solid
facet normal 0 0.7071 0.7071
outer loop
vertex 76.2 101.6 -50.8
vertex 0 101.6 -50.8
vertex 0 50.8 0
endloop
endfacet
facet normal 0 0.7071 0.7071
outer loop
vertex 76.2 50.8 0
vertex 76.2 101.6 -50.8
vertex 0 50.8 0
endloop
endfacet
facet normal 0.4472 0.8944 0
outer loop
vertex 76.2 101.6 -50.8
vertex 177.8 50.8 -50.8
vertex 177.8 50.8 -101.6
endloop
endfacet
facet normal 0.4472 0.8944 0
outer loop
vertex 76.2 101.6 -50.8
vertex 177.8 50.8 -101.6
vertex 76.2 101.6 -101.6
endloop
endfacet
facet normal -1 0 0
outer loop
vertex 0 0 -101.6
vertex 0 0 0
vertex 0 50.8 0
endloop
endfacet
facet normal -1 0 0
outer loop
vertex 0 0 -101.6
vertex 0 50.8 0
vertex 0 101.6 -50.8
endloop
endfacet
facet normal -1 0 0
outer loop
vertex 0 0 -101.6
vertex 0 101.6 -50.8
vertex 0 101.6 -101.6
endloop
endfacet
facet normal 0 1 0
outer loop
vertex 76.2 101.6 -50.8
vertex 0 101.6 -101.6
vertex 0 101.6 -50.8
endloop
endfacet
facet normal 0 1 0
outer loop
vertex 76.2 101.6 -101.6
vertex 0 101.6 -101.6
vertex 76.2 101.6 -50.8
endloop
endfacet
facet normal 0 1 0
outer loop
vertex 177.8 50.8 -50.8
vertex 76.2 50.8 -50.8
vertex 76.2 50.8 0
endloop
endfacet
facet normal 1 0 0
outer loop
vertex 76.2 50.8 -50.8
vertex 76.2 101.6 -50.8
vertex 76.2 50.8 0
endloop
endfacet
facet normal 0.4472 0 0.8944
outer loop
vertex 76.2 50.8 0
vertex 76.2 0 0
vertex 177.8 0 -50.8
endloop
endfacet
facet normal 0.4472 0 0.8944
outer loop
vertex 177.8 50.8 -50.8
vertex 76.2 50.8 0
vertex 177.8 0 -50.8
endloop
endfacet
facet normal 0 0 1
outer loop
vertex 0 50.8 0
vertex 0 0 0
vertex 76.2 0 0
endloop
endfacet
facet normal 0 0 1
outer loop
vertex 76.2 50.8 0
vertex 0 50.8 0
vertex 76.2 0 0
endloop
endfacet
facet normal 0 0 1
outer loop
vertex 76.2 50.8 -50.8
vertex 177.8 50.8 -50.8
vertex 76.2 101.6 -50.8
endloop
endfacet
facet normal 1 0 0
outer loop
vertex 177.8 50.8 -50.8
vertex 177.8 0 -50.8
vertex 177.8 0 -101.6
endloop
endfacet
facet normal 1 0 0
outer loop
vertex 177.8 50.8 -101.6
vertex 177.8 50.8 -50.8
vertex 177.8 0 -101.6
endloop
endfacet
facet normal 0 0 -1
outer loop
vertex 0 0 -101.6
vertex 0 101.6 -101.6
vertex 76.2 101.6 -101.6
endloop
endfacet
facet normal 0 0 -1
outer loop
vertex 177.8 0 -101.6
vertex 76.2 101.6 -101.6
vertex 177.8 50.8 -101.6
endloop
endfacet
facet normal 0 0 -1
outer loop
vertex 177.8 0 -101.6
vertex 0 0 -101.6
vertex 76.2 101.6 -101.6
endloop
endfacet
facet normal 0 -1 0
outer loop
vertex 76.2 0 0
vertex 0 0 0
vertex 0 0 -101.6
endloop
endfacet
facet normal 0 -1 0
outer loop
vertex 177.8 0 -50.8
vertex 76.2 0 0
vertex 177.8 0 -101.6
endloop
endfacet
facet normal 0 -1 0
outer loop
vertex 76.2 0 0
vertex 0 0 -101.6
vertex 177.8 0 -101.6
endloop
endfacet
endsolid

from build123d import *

# Parameters (mm, degrees)
SKETCH1_W                = 177.8
SKETCH1_H                = 101.6
BOSS_EXTRUDE1_DEPTH      = 101.6
CUT_EXTRUDE7_DEPTH       = 1
CUT_EXTRUDE7_DEPTH_BACK  = 76.2
CUT_EXTRUDE10_DEPTH      = 50.8
CUT_EXTRUDE12_DEPTH      = 1
CUT_EXTRUDE12_DEPTH_BACK = 101.6
CUT_EXTRUDE22_DEPTH      = 50.8
CUT_EXTRUDE25_DEPTH      = 50.8


with BuildPart() as part:
    # Sketch1 → Boss-Extrude1 (new body)
    with BuildSketch(Plane(origin=(0, 0, 0), x_dir=(1, 0, 0), z_dir=(0, 1, 0))):
        with Locations((88.9, 50.8)):
            Rectangle(SKETCH1_W, SKETCH1_H)
    extrude(amount=BOSS_EXTRUDE1_DEPTH)

    # Sketch2 → Cut-Extrude7 (cut, two sides)
    with BuildSketch(Plane.ZY) as cut_extrude7_sk:
        Polygon((210.271067812, -159.471067812), (0, 50.8), (-50.8, 101.6), (0, 101.6), (297.368195874, 101.6), (861.537049505, -86.614984162), (774.439921442, -347.686051974), align=None)
    extrude(amount=CUT_EXTRUDE7_DEPTH, mode=Mode.SUBTRACT)
    extrude(cut_extrude7_sk.sketch, amount=-CUT_EXTRUDE7_DEPTH_BACK, mode=Mode.SUBTRACT)

    # Sketch6 → Cut-Extrude10 (cut)
    with BuildSketch(Plane(origin=(0, 0, 0), x_dir=(1, 0, 0), z_dir=(0, 1, 0))):
        Polygon((76.2, 0), (177.8, 50.8), (177.8, 0), align=None)
    extrude(amount=CUT_EXTRUDE10_DEPTH, mode=Mode.SUBTRACT)

    # Sketch8 → Cut-Extrude12 (cut, two sides)
    with BuildSketch(Plane(origin=(0, 101.6, 0), x_dir=(1, 0, 0), z_dir=(0, 1, 0))) as cut_extrude12_sk:
        Polygon((177.8, 50.8), (76.2, 0), (177.8, 0), align=None)
    extrude(amount=CUT_EXTRUDE12_DEPTH, mode=Mode.SUBTRACT)
    extrude(cut_extrude12_sk.sketch, amount=-CUT_EXTRUDE12_DEPTH_BACK, mode=Mode.SUBTRACT)

    # Sketch11 → Cut-Extrude22 (cut)
    with BuildSketch(Plane(origin=(0, 101.6, 0), x_dir=(1, 0, 0), z_dir=(0, 1, 0))):
        Polygon((177.8, 50.8), (76.2, 50.8), (76.2, 0), align=None)
    extrude(amount=-CUT_EXTRUDE22_DEPTH, mode=Mode.SUBTRACT)

    # Sketch15 → Cut-Extrude25 (cut)
    with BuildSketch(Plane.XY.offset(-50.8)):
        Polygon((177.8, 50.8), (76.2, 101.6), (177.8, 101.6), align=None)
    extrude(amount=-CUT_EXTRUDE25_DEPTH, mode=Mode.SUBTRACT)


solid = part.part
